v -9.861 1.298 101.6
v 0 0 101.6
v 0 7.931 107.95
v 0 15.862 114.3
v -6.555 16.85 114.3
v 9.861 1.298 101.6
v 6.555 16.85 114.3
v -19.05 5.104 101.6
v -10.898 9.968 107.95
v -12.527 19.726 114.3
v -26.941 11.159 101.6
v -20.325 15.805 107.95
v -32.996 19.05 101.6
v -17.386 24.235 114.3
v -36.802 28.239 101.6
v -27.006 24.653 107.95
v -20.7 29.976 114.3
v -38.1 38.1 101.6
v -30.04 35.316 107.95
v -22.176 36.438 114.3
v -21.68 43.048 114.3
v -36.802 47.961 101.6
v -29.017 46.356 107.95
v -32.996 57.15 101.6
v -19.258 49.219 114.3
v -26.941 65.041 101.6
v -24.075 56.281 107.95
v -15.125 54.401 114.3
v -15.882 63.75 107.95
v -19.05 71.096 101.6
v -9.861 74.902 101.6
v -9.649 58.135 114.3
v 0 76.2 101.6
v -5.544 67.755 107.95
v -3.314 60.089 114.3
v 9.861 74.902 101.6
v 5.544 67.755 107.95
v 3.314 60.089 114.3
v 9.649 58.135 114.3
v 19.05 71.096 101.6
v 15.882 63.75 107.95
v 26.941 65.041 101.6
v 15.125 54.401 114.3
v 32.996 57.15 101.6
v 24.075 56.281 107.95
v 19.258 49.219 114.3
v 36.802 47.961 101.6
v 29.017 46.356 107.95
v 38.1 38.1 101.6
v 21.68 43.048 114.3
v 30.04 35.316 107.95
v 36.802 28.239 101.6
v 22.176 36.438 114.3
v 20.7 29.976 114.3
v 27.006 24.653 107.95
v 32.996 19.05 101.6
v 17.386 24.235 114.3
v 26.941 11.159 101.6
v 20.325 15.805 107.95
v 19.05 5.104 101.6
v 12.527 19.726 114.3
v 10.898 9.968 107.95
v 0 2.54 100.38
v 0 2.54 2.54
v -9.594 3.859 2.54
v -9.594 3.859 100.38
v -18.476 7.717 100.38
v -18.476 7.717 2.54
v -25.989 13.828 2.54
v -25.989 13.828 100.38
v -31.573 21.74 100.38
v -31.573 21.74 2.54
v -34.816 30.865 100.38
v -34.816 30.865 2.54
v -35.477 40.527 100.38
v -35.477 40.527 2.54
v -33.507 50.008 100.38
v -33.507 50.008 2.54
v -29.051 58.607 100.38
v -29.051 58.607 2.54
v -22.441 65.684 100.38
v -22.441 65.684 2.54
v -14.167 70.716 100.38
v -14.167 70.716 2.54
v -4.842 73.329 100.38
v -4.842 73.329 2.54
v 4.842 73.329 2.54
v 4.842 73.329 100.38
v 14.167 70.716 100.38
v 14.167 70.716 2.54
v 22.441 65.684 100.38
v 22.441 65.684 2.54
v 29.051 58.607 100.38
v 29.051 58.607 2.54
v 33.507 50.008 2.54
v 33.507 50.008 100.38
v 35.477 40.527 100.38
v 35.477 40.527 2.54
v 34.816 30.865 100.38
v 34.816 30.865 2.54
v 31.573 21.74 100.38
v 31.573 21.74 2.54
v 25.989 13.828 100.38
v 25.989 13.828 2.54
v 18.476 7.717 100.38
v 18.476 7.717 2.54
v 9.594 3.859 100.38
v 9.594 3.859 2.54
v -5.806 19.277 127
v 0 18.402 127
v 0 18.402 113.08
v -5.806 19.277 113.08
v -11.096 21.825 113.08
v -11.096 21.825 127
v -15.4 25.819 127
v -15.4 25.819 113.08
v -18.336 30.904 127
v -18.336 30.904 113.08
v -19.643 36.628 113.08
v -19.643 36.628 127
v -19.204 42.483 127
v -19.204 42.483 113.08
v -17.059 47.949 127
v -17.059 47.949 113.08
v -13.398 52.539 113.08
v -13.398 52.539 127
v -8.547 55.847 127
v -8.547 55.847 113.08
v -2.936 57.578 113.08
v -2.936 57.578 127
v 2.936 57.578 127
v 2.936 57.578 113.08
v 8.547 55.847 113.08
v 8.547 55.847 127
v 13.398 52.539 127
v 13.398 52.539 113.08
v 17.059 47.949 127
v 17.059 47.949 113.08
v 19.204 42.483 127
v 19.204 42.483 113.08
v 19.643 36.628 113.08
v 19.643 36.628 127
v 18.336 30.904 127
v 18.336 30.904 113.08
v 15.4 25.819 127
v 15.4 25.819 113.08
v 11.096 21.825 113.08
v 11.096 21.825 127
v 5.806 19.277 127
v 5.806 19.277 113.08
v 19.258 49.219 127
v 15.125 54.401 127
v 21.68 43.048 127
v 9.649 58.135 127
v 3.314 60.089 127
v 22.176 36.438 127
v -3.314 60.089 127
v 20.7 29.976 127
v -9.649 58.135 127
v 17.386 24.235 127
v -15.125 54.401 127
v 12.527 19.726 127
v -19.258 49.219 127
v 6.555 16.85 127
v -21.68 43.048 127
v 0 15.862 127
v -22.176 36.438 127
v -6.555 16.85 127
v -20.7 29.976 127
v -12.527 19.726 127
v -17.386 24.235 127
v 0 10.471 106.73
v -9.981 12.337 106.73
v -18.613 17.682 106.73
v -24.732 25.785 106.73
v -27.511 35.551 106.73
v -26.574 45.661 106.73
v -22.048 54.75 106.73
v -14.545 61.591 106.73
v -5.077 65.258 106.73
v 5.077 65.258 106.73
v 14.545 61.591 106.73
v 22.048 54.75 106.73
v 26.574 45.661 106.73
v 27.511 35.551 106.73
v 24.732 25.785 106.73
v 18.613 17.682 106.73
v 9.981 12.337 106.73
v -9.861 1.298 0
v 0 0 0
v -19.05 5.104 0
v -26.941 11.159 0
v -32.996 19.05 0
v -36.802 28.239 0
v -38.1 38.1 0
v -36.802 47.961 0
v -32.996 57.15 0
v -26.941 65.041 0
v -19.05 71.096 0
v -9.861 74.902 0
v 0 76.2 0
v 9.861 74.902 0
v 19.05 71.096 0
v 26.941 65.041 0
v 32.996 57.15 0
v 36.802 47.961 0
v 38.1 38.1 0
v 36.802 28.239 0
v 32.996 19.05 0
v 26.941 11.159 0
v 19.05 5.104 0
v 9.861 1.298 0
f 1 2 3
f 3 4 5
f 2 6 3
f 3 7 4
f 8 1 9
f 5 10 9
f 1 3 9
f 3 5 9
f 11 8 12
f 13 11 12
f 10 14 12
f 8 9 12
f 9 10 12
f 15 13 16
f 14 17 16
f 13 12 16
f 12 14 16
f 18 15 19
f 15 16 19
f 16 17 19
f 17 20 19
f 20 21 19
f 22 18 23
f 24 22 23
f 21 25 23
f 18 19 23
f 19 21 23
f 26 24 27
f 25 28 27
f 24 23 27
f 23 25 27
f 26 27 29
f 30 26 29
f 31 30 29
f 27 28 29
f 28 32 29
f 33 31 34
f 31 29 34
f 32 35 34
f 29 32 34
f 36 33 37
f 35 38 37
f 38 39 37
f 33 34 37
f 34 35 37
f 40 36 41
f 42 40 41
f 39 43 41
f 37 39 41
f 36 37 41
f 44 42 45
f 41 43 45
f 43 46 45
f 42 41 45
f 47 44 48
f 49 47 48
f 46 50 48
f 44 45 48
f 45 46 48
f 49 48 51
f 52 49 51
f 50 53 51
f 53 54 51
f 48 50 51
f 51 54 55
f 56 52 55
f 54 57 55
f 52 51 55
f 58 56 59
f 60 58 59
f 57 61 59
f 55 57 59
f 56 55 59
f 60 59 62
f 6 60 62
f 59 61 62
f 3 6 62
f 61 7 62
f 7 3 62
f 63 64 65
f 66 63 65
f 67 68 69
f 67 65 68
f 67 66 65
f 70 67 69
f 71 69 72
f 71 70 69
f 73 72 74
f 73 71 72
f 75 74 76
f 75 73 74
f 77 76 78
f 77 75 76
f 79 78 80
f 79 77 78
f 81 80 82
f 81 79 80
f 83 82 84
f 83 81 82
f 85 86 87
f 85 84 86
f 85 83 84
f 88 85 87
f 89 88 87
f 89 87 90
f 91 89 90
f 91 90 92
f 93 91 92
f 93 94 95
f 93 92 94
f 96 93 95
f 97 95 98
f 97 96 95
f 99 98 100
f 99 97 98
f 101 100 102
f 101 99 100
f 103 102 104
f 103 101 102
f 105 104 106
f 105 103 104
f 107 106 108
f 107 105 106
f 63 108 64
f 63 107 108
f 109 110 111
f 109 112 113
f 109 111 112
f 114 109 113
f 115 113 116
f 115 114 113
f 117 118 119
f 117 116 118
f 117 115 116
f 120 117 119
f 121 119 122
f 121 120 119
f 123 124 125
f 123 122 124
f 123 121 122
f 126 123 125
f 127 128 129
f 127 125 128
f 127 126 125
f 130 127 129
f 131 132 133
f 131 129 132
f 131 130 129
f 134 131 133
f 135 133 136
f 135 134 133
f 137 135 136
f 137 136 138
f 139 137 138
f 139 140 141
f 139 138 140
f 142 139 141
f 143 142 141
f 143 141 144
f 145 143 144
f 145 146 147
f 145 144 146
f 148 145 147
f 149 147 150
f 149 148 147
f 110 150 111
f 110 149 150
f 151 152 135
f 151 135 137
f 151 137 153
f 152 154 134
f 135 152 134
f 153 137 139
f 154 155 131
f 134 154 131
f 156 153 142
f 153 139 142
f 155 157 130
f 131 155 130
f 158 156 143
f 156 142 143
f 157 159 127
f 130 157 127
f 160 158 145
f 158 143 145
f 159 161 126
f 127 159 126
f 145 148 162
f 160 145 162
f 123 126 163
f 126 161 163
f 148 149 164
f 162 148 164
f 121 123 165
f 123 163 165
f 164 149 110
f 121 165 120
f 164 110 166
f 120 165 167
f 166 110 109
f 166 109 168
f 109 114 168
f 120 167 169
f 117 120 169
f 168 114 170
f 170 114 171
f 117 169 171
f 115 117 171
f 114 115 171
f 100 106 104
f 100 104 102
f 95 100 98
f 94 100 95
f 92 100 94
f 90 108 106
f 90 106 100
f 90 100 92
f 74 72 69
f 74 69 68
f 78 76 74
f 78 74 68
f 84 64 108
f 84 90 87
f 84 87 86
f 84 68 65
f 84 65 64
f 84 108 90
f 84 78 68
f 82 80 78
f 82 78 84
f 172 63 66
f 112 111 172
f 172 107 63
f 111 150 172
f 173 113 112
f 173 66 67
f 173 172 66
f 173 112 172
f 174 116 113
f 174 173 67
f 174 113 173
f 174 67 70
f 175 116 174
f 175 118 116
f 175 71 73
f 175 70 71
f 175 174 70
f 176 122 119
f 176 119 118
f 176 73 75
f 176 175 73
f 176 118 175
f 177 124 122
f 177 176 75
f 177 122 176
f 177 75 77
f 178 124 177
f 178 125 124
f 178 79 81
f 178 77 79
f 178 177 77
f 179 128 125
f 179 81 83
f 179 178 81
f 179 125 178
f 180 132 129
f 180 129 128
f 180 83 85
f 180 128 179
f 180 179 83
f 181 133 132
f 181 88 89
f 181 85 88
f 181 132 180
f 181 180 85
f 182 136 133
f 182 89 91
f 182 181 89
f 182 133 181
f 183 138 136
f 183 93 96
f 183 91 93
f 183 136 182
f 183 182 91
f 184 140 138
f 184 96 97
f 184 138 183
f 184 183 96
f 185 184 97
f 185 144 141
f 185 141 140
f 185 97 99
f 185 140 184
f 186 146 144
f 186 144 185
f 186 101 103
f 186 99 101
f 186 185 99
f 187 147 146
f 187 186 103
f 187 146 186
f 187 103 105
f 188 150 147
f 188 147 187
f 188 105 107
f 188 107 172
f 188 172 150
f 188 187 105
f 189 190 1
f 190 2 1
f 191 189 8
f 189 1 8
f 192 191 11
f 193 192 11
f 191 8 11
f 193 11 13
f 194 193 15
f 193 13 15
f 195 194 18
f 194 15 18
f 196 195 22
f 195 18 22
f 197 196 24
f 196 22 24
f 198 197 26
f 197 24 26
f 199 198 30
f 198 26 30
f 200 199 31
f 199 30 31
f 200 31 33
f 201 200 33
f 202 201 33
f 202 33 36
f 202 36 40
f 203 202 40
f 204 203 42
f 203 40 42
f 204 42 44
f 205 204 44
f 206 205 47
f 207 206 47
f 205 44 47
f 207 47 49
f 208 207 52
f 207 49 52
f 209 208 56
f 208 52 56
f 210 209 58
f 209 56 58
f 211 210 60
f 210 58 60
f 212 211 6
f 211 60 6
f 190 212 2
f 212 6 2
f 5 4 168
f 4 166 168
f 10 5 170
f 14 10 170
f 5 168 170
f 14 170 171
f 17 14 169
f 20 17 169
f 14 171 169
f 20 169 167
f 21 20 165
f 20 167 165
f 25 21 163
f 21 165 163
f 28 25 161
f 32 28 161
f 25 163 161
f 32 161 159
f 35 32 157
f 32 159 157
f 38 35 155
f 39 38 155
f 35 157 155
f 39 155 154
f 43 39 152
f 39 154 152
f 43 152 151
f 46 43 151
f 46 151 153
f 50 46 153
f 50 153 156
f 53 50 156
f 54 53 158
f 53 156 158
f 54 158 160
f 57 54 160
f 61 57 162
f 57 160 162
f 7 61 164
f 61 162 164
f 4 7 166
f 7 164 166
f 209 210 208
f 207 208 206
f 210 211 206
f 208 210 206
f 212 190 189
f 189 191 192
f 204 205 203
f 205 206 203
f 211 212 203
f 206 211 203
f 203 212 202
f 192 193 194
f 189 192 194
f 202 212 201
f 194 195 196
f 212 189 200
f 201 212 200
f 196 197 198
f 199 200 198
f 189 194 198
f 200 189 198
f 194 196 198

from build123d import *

# Parameters (mm, degrees)
SHELL1_T = -2.54


with BuildPart() as part:
    # Sketch1 → Revolve1 (revolve)
    with BuildSketch(Plane.YZ):
        Polygon((0, 0), (0, 101.6), (15.862294916, 114.3), (15.862294916, 127), (38.1, 127), (38.1, 0), align=None)
    revolve(axis=Axis((0, 38.1, 127), (0, 0, -1)))

    # Shell1
    shell1_openings = [part.faces().sort_by_distance(p)[0] for p in [
        (0, 38.1, 127),
    ]]
    offset(amount=SHELL1_T, openings=shell1_openings, kind=Kind.INTERSECTION)


solid = part.part
